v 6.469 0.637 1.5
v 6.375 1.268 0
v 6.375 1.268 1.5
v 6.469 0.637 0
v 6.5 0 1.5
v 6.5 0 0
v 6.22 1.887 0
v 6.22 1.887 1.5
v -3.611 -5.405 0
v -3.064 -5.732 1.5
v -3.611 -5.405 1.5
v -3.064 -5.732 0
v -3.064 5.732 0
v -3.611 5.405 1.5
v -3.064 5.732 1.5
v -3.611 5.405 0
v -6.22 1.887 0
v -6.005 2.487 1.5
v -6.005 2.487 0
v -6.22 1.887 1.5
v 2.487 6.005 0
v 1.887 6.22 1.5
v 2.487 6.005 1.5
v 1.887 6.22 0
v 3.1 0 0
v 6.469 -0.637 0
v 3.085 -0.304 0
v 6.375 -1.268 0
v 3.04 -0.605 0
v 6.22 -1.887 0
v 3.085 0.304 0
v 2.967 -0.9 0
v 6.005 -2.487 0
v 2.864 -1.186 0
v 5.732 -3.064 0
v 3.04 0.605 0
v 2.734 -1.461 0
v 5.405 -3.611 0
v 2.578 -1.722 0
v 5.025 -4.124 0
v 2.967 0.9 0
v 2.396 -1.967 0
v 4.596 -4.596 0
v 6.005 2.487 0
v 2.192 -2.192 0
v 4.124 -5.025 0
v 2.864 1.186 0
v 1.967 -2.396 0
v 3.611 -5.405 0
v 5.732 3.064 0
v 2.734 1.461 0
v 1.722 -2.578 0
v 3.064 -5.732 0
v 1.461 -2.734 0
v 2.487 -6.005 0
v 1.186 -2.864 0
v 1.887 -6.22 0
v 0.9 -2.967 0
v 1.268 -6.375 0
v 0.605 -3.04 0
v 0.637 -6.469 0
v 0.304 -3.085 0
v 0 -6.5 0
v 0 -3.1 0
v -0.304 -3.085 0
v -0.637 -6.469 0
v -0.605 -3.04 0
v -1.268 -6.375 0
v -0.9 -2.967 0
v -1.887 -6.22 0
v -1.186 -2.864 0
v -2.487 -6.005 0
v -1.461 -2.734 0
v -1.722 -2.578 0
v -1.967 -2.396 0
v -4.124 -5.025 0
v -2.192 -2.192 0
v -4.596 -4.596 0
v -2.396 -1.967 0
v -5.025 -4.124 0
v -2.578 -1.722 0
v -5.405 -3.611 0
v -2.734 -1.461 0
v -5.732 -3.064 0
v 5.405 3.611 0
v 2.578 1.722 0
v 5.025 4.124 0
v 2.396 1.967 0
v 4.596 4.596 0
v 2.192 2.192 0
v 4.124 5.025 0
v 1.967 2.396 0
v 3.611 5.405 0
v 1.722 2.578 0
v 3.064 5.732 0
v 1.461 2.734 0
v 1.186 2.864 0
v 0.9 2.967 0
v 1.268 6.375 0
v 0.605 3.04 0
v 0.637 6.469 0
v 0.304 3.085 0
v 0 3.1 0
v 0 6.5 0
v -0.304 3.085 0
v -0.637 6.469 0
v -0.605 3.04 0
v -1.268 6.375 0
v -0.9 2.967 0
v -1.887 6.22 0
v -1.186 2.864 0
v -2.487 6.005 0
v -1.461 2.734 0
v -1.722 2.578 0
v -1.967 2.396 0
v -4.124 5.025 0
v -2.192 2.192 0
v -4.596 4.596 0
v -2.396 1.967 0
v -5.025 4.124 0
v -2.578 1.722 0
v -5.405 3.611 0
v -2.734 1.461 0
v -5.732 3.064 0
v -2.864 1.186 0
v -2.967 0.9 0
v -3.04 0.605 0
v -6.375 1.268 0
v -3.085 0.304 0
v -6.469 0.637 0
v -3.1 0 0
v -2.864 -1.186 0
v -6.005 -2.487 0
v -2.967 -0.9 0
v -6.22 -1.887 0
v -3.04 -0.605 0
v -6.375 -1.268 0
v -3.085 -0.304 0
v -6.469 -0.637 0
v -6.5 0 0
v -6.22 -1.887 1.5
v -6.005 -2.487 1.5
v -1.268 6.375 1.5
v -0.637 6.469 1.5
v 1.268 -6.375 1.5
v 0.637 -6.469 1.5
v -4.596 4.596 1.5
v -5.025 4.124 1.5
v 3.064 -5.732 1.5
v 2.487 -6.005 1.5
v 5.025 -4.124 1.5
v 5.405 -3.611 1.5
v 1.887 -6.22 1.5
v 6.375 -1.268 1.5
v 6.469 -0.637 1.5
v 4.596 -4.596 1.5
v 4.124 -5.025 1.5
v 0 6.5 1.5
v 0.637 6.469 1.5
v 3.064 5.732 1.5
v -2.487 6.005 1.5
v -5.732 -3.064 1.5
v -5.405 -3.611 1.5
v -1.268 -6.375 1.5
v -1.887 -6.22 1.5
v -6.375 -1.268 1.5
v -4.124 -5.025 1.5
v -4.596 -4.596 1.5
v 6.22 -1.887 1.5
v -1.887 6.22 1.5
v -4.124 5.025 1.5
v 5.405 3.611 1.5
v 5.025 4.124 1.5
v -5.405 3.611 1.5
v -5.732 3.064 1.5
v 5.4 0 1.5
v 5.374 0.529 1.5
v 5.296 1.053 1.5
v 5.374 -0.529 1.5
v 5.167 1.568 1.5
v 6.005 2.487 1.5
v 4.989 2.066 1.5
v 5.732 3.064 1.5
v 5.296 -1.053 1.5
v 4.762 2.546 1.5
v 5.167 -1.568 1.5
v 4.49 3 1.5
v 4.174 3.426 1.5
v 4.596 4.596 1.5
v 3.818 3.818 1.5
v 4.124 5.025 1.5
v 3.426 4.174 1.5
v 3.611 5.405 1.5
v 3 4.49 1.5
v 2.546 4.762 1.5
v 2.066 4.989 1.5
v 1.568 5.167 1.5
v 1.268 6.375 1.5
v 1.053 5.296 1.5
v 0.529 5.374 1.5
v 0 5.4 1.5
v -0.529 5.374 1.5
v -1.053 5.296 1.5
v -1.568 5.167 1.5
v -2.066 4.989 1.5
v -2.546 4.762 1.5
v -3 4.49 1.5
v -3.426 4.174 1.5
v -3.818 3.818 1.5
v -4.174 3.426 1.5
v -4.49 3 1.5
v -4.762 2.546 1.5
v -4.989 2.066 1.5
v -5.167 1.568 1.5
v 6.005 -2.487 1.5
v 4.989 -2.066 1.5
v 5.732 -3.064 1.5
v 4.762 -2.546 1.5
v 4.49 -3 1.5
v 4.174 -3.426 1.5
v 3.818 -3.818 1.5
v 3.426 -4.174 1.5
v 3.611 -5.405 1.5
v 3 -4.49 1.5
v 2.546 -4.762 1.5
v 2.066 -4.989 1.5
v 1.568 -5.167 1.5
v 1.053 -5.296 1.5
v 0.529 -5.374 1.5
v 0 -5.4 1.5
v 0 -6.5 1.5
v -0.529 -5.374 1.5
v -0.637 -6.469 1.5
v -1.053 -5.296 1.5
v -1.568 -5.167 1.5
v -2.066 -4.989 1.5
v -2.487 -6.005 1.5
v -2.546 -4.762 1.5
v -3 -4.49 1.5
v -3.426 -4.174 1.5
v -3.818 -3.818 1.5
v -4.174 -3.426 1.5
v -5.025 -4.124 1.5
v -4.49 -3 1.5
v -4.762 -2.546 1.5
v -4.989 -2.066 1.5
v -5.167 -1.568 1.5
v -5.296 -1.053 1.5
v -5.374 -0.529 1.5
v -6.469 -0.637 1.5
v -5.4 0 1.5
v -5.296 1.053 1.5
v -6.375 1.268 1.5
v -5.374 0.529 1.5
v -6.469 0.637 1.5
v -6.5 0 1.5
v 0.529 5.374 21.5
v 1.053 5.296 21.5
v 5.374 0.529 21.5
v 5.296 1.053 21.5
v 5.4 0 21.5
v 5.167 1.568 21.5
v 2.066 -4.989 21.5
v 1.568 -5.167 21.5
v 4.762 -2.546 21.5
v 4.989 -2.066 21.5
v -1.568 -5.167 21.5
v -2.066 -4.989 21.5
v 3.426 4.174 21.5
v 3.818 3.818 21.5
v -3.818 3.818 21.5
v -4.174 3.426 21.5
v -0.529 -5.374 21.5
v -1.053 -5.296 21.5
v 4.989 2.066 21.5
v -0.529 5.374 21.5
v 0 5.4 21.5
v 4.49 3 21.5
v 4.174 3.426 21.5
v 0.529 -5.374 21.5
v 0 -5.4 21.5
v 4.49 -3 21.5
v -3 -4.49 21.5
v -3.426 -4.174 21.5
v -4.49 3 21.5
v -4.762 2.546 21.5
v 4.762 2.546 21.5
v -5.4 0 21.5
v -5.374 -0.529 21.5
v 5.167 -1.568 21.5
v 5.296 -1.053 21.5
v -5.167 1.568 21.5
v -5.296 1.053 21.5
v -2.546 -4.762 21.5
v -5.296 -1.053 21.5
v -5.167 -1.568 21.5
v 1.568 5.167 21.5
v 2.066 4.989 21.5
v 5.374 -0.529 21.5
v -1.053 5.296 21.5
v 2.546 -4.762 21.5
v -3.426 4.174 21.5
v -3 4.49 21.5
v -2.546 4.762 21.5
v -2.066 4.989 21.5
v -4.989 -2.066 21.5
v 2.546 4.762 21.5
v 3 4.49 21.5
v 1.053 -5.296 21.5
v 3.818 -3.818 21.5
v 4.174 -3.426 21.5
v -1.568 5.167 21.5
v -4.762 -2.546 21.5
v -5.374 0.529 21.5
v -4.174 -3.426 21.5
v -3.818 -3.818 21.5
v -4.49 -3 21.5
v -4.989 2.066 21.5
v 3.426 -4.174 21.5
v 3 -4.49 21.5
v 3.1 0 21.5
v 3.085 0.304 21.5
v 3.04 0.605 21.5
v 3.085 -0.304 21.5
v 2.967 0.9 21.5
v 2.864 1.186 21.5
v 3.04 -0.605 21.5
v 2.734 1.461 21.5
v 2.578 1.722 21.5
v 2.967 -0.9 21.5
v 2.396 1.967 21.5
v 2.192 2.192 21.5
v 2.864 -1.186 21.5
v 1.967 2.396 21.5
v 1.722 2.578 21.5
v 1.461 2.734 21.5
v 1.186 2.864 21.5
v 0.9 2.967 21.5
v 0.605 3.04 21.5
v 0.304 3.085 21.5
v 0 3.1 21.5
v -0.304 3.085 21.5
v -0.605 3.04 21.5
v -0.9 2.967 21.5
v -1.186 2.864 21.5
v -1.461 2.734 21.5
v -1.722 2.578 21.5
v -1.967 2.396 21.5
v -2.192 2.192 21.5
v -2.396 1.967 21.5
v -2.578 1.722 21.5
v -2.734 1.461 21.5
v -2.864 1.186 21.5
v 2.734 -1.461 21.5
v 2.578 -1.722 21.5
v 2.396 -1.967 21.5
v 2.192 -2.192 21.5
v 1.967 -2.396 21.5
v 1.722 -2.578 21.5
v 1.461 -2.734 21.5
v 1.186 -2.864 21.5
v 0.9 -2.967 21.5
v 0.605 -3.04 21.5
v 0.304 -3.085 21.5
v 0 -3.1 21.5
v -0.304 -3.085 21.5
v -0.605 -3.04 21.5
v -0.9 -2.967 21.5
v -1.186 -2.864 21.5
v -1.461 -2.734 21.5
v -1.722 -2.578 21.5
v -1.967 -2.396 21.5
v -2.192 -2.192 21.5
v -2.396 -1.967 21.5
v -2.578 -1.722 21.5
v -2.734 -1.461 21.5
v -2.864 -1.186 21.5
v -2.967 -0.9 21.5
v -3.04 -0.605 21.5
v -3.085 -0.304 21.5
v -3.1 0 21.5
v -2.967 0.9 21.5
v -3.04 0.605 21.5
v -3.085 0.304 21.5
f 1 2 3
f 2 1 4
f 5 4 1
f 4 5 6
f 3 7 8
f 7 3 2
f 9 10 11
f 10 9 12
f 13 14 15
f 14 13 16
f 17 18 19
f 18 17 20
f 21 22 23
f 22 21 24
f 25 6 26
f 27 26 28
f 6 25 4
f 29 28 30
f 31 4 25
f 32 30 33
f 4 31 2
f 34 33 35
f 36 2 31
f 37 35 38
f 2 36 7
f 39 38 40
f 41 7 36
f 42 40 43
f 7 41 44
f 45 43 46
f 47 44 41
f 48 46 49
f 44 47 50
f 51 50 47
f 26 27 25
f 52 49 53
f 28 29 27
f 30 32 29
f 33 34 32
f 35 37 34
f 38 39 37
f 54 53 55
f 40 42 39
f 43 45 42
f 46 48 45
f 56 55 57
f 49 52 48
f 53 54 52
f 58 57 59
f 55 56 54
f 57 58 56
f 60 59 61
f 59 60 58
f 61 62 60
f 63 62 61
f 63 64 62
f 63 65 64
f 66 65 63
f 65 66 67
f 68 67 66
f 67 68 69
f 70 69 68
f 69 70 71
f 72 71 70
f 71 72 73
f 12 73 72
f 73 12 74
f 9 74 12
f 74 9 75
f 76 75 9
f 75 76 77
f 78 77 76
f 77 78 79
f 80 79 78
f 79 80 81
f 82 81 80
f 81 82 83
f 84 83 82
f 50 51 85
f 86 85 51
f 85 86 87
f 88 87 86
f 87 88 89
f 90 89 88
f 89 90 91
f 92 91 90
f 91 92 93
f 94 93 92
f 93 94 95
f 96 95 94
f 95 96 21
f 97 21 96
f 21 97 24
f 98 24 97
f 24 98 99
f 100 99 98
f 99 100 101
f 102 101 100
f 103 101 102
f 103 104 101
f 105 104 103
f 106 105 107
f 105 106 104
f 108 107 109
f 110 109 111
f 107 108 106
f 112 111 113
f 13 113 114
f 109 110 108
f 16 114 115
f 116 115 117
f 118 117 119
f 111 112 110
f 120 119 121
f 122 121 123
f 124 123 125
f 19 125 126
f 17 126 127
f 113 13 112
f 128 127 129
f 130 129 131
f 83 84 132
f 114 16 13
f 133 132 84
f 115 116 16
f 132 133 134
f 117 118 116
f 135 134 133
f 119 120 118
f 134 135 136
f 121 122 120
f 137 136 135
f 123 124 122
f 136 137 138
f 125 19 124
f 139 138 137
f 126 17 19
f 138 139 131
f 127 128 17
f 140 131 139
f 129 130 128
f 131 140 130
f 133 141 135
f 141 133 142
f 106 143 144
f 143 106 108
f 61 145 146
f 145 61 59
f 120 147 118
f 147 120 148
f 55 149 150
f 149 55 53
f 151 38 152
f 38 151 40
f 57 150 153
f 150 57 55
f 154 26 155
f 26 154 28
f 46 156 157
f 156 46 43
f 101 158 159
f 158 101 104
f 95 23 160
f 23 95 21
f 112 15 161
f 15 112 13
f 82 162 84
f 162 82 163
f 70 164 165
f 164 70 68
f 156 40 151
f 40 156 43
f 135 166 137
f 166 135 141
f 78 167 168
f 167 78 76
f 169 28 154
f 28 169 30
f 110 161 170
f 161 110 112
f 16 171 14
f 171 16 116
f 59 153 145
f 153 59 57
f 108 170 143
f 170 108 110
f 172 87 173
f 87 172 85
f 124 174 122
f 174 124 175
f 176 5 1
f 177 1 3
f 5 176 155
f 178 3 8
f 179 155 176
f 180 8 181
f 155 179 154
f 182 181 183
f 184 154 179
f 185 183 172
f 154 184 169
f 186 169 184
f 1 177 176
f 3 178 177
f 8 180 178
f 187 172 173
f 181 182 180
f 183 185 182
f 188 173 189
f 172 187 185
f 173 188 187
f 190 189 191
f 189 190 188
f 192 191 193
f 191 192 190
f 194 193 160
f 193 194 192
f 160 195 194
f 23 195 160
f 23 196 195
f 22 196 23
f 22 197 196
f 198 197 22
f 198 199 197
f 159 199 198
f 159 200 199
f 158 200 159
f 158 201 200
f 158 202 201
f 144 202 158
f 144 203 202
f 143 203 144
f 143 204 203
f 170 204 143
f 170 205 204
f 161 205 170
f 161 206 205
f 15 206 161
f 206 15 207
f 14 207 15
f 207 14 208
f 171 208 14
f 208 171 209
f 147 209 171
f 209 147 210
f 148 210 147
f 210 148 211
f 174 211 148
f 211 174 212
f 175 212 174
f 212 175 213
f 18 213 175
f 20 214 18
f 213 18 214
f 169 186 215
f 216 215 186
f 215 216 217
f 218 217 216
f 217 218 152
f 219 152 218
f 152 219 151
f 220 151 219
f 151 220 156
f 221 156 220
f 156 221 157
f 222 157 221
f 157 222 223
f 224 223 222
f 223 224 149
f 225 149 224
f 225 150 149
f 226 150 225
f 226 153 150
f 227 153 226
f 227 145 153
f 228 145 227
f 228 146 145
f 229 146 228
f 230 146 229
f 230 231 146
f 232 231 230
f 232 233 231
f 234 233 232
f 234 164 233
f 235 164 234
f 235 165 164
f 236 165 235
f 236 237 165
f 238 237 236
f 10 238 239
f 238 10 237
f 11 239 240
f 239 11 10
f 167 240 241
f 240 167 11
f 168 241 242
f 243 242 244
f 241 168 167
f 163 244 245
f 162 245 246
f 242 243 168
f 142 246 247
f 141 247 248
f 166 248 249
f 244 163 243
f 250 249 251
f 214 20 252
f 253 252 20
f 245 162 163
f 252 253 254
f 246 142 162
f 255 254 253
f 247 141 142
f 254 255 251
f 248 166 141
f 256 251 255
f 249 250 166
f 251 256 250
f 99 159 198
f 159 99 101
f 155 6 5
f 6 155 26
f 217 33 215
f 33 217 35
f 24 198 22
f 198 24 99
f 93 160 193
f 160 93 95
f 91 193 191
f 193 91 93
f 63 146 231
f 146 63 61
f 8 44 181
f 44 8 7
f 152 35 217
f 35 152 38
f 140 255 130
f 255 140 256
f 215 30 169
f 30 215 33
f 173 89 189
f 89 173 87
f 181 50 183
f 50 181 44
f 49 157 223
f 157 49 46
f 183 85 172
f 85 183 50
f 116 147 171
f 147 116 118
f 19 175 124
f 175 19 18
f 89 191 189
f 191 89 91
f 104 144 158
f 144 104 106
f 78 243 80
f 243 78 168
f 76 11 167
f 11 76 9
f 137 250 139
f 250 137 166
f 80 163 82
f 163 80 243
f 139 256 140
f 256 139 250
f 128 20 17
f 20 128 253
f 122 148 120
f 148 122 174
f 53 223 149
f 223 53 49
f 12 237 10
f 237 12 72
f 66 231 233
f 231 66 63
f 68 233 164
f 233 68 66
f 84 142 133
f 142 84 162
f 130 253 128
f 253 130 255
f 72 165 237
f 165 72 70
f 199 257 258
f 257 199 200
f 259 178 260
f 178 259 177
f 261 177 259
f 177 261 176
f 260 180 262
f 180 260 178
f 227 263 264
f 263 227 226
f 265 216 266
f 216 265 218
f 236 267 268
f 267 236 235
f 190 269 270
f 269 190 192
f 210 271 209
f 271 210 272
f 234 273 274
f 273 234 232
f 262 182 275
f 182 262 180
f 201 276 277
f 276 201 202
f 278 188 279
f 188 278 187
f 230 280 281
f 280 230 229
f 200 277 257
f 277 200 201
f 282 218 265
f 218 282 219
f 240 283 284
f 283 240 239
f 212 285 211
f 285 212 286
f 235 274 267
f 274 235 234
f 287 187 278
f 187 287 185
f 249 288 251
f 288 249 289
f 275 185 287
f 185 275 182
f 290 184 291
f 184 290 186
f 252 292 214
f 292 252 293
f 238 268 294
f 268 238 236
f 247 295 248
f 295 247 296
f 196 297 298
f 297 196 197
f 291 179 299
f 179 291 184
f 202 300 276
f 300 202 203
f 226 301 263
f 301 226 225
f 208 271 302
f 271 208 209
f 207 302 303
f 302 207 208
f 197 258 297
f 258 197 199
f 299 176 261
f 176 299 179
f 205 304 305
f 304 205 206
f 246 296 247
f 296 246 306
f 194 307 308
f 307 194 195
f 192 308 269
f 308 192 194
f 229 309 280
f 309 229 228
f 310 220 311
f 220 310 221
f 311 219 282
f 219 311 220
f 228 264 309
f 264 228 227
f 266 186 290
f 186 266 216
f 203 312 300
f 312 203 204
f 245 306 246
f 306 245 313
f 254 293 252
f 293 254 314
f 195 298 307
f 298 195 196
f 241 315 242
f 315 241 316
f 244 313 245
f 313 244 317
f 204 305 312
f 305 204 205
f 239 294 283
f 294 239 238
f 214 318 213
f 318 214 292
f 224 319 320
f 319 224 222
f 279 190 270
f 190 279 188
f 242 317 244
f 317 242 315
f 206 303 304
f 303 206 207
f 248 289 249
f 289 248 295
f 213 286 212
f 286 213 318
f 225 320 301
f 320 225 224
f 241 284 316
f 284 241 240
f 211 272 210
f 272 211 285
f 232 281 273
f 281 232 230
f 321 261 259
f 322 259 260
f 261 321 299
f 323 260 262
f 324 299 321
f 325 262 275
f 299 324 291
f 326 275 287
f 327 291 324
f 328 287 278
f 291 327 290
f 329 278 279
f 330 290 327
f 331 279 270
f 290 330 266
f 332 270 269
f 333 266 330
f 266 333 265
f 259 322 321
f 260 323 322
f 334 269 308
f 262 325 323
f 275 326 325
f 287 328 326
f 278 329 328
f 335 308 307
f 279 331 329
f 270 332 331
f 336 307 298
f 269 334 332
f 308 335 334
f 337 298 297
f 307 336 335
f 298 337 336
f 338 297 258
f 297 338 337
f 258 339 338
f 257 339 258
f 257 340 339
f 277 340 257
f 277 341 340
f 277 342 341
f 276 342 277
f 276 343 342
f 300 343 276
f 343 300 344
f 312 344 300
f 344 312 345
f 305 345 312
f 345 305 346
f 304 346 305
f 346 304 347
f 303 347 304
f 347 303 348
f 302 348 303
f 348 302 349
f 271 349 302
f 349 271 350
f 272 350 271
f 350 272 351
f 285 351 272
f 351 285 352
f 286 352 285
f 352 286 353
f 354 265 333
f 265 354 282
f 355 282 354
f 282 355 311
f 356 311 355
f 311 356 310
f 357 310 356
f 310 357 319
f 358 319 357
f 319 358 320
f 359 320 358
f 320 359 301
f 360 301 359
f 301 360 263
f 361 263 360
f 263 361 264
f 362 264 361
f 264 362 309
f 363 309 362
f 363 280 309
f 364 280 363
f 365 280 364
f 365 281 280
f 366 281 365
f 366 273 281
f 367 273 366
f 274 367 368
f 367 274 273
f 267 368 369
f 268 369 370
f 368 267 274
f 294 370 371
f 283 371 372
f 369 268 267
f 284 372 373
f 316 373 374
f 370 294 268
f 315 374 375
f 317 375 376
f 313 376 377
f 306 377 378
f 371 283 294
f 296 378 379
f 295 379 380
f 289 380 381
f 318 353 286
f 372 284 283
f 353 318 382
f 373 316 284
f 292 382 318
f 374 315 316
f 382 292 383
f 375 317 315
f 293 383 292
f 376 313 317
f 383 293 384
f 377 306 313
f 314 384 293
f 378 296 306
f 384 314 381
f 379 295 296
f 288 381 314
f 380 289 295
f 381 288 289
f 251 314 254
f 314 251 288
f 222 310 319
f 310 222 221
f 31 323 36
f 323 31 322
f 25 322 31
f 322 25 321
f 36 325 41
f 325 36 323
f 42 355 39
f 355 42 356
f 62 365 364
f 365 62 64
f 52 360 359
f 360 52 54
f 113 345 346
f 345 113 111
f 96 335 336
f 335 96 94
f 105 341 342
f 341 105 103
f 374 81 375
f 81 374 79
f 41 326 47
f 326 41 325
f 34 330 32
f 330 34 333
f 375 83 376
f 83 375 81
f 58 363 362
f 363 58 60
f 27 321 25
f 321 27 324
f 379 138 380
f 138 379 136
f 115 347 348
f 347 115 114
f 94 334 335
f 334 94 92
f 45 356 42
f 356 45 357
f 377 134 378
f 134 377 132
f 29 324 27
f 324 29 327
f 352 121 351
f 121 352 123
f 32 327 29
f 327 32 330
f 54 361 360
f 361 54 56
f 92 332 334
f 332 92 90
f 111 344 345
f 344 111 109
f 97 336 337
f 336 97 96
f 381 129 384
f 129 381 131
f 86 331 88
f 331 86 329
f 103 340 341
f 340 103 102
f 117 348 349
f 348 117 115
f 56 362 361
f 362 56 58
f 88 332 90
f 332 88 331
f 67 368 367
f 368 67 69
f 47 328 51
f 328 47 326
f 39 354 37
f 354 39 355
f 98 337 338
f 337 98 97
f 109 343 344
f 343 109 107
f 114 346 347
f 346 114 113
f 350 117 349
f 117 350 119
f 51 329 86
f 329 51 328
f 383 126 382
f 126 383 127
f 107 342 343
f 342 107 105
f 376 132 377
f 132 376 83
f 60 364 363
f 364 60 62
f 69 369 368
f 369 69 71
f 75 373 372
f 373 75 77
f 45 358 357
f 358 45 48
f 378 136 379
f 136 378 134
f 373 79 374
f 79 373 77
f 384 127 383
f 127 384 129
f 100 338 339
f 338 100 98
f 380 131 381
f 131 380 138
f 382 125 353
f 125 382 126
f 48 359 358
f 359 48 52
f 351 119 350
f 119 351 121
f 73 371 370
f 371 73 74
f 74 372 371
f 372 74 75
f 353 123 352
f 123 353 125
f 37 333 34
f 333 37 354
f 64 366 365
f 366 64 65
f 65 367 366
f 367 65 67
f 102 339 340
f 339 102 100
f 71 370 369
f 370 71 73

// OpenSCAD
// PCR tube adapter sleeve - fits 0.2 mL tubes into 1.5 mL rack holes
// Print orientation: collar on bed (z = 0), sleeve body rises to z = 21.5

$fn = 64;

// --- Dimensions (mm) ---
collar_d        = 13;     // collar outer diameter
collar_h        = 1.5;    // collar thickness (z = 0 to 1.5)
sleeve_od       = 10.8;   // sleeve body outer diameter
sleeve_h        = 20;     // sleeve body height above collar (z = 1.5 to 21.5)
bore_d          = 6.2;    // through-bore diameter
eps             = 0.5;    // cutter overshoot past faces

total_h = collar_h + sleeve_h; // 21.5 mm overall height

difference() {
    union() {
        // Collar
        cylinder(d = collar_d, h = collar_h);
        // Sleeve body (slightly overlapping collar for a clean union)
        translate([0, 0, collar_h - 0.01])
            cylinder(d = sleeve_od, h = sleeve_h + 0.01);
    }
    // Through-bore, open at both ends
    translate([0, 0, -eps])
        cylinder(d = bore_d, h = total_h + 2 * eps);
}
